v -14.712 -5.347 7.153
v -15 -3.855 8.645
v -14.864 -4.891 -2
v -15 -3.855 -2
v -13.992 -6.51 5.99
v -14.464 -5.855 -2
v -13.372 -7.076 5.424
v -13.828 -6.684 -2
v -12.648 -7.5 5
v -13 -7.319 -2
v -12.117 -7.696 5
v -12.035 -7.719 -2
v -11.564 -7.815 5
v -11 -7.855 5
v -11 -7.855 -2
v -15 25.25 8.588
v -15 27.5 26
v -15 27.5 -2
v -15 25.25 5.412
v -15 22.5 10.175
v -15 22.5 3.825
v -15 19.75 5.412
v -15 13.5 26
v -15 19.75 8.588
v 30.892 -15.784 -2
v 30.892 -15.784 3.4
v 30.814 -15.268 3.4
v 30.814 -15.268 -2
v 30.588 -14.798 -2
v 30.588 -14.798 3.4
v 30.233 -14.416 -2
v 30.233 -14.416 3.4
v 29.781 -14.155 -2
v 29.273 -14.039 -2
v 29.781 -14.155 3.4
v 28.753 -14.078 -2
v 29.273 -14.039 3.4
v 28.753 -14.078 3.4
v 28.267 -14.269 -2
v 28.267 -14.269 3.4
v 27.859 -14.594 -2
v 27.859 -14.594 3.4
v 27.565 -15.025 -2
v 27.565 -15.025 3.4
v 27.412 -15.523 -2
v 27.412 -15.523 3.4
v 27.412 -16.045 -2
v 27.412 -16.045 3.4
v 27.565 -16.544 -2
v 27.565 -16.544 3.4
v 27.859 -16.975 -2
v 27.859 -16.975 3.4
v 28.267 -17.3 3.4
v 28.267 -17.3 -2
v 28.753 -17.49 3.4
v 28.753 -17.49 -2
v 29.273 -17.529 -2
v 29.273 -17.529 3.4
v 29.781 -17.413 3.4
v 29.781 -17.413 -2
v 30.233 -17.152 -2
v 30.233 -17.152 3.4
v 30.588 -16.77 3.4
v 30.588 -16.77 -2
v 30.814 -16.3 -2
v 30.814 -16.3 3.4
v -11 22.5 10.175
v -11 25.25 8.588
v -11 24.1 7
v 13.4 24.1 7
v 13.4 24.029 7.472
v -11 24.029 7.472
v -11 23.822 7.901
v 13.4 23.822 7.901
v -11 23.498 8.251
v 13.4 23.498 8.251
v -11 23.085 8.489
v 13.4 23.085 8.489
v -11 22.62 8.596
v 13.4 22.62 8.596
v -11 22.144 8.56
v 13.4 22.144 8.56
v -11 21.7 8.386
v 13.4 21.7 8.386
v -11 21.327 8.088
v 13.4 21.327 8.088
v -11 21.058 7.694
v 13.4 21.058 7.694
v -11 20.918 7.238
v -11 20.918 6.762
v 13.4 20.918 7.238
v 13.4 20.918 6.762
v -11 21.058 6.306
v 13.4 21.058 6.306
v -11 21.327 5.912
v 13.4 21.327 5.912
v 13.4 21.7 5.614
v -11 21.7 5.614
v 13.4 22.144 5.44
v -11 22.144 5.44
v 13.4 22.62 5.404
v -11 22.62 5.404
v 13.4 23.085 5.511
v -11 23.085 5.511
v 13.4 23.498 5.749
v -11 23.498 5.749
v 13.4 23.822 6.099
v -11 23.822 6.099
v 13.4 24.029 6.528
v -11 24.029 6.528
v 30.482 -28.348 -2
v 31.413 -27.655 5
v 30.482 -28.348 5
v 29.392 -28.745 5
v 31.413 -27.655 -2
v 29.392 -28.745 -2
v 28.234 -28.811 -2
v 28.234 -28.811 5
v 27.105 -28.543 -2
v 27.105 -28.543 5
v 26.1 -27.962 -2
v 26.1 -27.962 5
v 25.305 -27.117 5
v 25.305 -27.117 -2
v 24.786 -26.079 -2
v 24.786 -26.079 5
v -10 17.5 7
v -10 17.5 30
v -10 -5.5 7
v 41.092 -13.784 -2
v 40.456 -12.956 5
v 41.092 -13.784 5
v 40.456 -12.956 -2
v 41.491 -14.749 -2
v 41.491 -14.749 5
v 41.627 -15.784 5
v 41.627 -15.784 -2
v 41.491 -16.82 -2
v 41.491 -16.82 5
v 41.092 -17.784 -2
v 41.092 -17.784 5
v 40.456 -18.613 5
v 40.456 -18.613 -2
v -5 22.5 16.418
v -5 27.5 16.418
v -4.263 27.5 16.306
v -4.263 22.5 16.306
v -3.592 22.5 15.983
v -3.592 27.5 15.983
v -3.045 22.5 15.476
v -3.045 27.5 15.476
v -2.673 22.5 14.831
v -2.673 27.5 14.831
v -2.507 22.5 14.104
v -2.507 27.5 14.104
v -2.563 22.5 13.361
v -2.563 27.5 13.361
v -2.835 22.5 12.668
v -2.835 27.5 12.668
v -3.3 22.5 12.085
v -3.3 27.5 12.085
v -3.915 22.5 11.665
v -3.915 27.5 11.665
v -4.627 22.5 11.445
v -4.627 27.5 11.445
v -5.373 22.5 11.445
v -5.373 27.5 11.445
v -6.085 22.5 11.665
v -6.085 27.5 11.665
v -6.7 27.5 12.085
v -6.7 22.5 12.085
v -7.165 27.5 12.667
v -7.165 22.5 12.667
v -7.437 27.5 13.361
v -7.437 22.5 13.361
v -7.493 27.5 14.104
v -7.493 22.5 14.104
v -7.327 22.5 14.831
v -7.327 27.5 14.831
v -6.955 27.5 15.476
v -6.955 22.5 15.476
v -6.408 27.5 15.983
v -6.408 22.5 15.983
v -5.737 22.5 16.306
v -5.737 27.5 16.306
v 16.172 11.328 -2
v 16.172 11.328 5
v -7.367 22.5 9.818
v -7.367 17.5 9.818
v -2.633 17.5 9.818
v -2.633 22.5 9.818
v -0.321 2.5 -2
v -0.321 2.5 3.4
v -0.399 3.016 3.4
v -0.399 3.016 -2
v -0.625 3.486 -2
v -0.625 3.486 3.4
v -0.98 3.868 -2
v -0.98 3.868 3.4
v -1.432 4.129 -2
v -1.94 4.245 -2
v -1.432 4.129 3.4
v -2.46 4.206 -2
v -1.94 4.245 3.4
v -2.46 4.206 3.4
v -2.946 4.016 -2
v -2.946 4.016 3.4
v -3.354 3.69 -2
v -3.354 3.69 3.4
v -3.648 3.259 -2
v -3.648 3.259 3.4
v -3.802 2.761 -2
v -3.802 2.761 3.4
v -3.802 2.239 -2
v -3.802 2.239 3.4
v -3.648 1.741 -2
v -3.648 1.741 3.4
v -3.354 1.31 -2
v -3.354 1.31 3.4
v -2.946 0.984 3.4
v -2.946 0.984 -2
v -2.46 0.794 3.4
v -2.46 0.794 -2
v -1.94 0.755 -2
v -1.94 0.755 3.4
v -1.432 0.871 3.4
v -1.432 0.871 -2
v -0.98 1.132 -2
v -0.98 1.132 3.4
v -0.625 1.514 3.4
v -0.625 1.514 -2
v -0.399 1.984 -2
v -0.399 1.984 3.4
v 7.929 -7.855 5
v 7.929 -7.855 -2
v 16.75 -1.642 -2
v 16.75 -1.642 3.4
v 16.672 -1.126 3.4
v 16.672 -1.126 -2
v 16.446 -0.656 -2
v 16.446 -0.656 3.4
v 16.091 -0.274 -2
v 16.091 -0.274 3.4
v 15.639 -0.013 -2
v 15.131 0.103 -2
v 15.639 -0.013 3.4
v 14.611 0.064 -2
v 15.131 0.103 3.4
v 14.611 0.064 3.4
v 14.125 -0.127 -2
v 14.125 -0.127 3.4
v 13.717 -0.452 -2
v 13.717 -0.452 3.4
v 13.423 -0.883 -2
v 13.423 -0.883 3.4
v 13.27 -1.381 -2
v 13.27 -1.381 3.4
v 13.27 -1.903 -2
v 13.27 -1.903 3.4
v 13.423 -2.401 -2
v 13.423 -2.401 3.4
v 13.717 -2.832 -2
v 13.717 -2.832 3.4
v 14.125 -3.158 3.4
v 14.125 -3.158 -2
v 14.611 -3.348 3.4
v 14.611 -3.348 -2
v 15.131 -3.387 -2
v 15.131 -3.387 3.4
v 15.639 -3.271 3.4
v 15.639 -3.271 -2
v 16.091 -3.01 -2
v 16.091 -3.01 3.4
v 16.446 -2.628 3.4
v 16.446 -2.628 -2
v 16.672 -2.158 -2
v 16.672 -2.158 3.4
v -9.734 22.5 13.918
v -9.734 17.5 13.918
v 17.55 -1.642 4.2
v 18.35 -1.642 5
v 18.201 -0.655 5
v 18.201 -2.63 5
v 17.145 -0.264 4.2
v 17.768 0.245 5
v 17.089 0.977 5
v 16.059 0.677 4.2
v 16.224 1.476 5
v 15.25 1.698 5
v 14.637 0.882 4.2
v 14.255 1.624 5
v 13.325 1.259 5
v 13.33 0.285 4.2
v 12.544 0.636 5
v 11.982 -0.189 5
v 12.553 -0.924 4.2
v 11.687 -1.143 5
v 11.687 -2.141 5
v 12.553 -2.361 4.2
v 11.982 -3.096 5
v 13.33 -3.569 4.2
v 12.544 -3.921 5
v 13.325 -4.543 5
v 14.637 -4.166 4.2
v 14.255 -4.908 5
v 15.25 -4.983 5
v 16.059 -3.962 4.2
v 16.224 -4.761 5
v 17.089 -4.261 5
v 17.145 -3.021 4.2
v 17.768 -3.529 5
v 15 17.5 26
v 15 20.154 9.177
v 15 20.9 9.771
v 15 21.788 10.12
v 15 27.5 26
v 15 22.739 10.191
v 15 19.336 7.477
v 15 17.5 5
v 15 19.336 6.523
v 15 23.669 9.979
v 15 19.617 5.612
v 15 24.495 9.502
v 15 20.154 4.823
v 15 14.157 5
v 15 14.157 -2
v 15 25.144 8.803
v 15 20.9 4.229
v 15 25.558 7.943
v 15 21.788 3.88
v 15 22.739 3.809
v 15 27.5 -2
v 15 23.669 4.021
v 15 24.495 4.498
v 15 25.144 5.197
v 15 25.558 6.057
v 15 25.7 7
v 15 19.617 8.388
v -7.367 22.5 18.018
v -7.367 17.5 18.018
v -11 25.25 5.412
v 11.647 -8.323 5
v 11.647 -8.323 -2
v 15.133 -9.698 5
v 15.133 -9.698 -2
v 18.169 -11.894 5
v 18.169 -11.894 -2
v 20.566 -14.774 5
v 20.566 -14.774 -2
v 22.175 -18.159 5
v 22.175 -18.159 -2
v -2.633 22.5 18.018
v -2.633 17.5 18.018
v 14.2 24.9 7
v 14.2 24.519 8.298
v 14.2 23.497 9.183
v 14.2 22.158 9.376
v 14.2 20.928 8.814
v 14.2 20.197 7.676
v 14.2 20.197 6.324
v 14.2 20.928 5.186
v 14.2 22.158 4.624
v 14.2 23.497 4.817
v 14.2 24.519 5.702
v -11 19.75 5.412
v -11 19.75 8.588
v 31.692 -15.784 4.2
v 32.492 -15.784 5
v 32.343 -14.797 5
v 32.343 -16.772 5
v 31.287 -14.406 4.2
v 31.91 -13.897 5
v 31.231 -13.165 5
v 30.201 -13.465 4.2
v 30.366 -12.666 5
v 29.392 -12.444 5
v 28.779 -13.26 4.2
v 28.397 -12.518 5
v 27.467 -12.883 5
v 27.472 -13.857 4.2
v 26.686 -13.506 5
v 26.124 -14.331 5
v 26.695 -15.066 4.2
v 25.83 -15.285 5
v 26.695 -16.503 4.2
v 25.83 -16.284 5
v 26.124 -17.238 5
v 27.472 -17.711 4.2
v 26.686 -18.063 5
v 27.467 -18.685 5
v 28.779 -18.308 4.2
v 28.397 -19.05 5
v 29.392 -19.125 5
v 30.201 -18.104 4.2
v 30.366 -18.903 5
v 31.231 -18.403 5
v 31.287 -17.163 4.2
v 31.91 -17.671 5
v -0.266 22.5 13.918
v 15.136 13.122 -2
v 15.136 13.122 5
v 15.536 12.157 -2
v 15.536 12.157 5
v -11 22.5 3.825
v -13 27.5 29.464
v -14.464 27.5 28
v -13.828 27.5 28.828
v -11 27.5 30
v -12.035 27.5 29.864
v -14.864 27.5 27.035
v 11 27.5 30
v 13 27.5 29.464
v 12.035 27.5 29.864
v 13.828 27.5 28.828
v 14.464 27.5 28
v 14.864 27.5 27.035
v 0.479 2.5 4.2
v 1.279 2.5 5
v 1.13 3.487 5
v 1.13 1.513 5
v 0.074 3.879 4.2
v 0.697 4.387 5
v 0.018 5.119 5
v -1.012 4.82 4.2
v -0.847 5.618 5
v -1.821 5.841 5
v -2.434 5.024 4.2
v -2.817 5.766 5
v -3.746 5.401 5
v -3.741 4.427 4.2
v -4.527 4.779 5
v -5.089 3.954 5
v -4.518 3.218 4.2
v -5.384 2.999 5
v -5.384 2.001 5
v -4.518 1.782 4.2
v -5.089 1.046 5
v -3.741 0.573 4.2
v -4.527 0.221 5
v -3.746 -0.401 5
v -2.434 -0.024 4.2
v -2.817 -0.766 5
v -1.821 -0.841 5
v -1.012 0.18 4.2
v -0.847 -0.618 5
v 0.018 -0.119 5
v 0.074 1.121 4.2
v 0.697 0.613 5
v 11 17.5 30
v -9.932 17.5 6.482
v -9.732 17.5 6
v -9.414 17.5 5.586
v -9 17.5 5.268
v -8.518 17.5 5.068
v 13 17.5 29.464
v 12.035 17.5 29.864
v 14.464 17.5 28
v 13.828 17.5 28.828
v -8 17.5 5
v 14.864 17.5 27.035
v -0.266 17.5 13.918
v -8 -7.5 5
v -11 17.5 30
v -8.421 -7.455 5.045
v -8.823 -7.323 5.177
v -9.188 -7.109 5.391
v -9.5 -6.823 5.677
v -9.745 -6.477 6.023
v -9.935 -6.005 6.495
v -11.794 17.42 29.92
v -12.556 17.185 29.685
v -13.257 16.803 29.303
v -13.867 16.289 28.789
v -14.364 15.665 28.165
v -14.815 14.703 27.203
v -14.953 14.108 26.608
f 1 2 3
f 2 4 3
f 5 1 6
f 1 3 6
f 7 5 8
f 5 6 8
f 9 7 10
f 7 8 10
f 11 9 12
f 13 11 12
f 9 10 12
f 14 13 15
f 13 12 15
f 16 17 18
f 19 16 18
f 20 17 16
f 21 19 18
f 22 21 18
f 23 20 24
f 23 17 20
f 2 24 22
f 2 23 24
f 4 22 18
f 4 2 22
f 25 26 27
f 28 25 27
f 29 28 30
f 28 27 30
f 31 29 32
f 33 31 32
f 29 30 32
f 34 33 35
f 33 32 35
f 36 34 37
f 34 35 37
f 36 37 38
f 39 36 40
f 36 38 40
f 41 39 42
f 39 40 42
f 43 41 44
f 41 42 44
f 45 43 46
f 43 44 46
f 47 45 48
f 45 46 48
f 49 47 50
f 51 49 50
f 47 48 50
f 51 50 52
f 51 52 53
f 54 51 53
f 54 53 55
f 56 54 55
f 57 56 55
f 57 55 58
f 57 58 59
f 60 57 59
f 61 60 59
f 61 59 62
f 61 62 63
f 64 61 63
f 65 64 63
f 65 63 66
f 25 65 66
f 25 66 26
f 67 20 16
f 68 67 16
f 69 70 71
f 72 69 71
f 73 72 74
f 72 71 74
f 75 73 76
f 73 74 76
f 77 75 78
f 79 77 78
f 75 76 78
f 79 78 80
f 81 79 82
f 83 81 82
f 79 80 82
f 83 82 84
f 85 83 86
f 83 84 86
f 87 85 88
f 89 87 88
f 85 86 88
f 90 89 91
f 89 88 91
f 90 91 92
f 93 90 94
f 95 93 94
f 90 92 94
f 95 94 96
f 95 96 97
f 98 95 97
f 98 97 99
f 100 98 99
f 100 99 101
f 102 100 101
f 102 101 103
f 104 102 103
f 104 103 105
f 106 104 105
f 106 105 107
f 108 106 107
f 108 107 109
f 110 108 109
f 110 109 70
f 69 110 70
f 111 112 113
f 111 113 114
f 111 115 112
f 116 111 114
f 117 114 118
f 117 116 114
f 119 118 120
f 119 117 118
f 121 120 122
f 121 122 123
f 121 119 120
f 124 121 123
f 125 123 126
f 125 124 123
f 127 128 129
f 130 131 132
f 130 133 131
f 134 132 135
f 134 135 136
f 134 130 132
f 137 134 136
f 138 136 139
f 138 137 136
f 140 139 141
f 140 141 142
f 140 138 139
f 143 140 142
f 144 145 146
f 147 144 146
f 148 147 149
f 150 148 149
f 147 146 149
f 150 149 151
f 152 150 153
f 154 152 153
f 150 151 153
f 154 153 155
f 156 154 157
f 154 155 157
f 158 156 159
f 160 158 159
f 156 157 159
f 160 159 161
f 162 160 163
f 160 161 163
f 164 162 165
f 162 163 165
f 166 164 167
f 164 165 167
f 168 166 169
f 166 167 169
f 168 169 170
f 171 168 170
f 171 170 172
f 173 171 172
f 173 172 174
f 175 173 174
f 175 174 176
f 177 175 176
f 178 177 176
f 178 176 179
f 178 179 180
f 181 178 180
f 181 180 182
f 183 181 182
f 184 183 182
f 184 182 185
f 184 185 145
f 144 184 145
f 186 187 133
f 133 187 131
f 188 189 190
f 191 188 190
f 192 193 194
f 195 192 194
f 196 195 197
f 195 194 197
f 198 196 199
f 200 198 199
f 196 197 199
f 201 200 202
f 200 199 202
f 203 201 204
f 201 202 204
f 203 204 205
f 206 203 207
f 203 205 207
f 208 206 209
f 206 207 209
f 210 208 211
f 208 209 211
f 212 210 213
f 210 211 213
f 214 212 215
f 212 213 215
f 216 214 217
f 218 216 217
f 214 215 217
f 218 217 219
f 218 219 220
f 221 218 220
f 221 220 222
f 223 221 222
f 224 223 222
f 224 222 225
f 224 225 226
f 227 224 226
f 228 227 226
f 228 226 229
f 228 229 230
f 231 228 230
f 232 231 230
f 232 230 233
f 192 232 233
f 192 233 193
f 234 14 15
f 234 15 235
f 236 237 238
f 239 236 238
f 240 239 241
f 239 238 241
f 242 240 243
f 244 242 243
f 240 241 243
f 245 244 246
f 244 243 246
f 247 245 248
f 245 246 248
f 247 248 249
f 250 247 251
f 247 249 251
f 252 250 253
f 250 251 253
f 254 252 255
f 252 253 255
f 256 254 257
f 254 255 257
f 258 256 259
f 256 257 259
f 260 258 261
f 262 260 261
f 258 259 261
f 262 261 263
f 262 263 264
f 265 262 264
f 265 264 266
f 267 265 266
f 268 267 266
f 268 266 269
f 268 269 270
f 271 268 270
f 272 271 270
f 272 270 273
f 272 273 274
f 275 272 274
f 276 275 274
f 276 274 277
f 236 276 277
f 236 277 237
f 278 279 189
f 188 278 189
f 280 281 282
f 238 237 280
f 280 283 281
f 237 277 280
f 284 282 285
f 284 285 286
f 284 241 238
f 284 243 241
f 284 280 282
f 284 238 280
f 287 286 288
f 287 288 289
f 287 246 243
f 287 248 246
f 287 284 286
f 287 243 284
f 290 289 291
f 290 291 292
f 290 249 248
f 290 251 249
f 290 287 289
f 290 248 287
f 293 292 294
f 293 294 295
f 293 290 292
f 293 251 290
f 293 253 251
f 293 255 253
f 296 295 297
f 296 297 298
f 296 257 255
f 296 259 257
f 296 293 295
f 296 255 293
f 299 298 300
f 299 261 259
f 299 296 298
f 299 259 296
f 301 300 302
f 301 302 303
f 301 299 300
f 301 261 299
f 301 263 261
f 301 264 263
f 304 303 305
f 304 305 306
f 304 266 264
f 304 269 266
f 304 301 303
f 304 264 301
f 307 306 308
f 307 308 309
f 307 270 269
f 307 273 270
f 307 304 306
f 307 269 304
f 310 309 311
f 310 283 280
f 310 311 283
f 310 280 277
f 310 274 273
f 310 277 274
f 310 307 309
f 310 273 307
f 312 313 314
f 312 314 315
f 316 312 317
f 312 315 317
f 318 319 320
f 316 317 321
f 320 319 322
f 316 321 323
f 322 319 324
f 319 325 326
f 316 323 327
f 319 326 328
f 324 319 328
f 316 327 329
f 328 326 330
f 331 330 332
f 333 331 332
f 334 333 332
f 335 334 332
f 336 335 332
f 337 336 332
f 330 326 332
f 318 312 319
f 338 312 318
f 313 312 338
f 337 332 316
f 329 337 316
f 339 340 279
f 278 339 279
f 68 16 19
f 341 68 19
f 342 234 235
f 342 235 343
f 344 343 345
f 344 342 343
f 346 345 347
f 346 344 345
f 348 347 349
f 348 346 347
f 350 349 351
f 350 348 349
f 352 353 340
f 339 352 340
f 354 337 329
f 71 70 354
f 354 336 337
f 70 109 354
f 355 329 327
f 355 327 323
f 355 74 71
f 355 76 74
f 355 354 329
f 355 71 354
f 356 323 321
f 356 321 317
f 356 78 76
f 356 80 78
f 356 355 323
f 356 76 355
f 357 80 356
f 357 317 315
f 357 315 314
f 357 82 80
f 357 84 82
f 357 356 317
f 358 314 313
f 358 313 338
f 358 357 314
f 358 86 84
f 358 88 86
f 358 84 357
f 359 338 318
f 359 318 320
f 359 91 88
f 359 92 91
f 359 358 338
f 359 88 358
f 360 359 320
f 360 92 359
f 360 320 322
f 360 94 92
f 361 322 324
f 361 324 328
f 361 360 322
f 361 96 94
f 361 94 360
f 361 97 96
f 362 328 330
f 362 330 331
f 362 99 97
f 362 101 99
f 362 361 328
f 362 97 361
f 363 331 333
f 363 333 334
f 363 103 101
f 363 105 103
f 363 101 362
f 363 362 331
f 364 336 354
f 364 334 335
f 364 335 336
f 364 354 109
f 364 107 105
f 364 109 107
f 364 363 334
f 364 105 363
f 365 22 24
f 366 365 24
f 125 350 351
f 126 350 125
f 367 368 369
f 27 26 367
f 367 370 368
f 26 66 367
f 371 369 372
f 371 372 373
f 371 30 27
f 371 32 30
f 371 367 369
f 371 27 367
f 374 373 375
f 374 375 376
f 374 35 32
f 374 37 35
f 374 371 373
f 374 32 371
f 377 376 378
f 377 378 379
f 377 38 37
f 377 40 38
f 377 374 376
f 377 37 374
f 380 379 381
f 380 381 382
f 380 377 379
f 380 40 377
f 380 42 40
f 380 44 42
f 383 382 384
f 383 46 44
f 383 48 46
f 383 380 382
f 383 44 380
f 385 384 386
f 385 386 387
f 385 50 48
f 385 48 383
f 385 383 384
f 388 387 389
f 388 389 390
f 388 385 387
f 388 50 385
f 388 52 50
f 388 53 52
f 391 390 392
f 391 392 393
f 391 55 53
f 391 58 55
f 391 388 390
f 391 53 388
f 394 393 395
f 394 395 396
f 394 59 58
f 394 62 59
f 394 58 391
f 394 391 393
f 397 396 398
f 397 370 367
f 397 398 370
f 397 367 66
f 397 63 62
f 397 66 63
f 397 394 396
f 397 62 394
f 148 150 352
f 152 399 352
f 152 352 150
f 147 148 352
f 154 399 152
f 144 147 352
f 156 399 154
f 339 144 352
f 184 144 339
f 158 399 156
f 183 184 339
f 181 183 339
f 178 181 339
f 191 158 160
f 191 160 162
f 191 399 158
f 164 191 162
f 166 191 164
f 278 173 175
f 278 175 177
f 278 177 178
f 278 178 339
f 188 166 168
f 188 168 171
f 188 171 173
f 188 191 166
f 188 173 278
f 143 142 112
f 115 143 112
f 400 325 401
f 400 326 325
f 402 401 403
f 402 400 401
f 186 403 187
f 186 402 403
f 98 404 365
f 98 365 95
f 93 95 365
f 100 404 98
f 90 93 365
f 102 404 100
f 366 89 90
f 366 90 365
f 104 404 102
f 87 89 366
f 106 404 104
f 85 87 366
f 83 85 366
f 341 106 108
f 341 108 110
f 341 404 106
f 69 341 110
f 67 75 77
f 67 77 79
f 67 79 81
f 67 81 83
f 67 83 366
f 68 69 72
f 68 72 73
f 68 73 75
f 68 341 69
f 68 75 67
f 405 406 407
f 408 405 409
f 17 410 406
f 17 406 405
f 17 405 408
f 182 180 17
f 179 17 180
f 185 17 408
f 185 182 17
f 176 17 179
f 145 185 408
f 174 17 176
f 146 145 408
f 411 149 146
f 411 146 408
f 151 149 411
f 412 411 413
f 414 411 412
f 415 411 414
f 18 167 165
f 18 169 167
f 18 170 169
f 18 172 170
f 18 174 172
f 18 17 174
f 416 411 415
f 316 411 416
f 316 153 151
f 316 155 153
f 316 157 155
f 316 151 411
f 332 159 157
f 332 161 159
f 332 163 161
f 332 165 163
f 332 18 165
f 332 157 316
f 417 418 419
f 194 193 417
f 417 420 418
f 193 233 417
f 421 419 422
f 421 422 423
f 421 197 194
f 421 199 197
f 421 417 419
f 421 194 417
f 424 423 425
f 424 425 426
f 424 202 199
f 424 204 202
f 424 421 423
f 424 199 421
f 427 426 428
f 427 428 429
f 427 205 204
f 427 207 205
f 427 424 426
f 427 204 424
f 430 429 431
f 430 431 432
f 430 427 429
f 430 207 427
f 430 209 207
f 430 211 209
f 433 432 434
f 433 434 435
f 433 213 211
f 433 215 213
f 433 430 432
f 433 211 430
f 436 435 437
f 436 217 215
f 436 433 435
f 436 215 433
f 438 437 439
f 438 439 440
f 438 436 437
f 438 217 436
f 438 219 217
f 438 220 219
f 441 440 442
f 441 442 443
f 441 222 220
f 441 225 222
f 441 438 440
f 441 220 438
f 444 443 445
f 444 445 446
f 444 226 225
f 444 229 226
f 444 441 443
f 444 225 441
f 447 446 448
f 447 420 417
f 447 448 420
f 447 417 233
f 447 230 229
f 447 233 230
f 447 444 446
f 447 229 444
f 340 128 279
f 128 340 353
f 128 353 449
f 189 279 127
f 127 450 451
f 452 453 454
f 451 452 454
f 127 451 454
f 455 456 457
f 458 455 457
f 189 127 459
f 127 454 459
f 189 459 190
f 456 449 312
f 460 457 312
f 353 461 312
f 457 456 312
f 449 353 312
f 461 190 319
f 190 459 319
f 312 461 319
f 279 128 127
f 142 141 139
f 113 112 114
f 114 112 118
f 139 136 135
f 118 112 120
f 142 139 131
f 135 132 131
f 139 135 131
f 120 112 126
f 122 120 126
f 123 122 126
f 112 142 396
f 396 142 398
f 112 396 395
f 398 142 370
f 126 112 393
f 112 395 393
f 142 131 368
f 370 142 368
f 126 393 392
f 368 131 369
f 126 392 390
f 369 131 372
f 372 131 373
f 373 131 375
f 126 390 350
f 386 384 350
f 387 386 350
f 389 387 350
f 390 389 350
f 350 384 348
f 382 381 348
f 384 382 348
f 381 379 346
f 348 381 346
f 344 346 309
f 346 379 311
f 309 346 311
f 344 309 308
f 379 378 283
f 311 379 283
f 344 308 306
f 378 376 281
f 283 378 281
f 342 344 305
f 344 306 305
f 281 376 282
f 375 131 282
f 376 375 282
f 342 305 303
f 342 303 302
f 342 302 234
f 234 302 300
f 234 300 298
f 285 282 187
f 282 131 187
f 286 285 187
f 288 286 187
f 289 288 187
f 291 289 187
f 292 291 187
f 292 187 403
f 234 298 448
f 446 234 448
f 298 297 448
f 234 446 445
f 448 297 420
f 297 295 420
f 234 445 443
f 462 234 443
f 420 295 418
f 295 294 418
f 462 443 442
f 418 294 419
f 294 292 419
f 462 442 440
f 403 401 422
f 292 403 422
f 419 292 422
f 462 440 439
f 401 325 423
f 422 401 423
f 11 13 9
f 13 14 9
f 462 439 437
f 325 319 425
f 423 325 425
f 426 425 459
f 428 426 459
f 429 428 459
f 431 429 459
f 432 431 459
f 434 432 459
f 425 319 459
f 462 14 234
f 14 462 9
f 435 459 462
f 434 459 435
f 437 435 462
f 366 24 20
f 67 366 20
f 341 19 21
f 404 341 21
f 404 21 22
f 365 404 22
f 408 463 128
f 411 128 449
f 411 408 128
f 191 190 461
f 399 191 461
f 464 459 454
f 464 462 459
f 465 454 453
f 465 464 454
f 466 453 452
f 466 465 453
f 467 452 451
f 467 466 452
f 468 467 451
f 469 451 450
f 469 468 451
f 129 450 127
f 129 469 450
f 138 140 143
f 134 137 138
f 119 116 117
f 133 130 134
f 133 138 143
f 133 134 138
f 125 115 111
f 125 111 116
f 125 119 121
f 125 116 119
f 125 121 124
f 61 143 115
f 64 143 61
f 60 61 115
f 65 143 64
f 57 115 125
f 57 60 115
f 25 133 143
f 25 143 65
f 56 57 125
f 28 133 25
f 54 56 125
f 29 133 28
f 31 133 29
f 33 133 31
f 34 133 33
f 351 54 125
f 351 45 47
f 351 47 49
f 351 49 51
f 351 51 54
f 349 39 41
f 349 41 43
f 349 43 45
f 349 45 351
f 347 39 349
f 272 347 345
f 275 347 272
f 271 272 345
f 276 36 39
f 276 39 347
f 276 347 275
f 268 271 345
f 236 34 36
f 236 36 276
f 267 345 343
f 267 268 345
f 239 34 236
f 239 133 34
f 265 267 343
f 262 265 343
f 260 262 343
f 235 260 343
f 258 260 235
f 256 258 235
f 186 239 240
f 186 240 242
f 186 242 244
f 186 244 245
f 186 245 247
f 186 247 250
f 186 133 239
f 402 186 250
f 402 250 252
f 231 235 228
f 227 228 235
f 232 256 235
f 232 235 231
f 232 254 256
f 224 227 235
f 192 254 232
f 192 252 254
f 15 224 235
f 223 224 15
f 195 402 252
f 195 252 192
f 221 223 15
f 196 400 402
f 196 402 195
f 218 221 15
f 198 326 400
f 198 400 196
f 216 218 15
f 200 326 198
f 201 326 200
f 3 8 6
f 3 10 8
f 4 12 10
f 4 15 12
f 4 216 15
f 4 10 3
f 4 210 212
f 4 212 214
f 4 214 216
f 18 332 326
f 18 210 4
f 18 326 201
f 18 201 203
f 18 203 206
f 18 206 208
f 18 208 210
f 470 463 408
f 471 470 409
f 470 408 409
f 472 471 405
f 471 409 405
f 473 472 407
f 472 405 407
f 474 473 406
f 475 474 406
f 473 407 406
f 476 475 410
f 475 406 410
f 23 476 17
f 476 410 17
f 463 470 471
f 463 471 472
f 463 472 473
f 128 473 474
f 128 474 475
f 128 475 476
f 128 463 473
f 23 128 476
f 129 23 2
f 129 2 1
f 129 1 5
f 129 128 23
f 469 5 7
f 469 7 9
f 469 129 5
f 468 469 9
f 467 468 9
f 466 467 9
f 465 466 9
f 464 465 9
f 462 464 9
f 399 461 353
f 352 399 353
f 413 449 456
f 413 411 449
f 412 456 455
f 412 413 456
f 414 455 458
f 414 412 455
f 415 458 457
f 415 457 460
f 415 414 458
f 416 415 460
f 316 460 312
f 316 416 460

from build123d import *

# Parameters (mm, degrees)
BOSS_EXTRUDE1_DEPTH      = 5
BOSS_EXTRUDE1_DEPTH_BACK = 2
SKETCH3_W                = 30
SKETCH3_H                = 10
BOSS_EXTRUDE2_DEPTH      = 25
SKETCH4_R                = 2.5
CUT_EXTRUDE1_DEPTH       = 83.331203834
RIB1_REACH               = 76.683
SKETCH6_WALL_W           = 186.72160491
SKETCH6_WALL_H           = 5
CUT_EXTRUDE2_DEPTH       = 7
CUT_EXTRUDE3_DEPTH       = 5
FILLET1_R                = 4
SKETCH9_R                = 1.75
CUT_EXTRUDE4_DEPTH       = 60.485369609
CHAMFER1_SIZE            = 1.6
FILLET2_R                = 4
SKETCH10_R               = 1.6
CUT_EXTRUDE5_DEPTH       = 52.293180378
CUT_EXTRUDE6_DEPTH       = 4
CHAMFER2_SIZE            = 1.6
FILLET3_R                = 2


with BuildPart() as part:
    # Sketch1 → Boss-Extrude1 (new, two sides)
    with BuildSketch(Plane.XY) as boss_extrude1_sk:
        Polygon((15, 27.5), (15, 12.5), (43.284271247, -15.784271247), (23.284271247, -35.784271247), (15, -27.5), (-15, -27.5), (-15, 27.5), align=None)
    extrude(amount=BOSS_EXTRUDE1_DEPTH)
    extrude(boss_extrude1_sk.sketch, amount=-BOSS_EXTRUDE1_DEPTH_BACK)

    # Sketch3 → Boss-Extrude2 (add)
    with BuildSketch(Plane.XY.offset(5)):
        with Locations((0, 22.5)):
            Rectangle(SKETCH3_W, SKETCH3_H)
    extrude(amount=BOSS_EXTRUDE2_DEPTH)

    # Sketch4 → Cut-Extrude1 (cut, through all)
    with BuildSketch(Plane(origin=(0, 27.5, 0), x_dir=(1, 0, 0), z_dir=(0, 1, 0))):
        with Locations(Location((-5, -13.9175, 0), (0, 0, 270))):
            Circle(SKETCH4_R)
    extrude(amount=-CUT_EXTRUDE1_DEPTH, mode=Mode.SUBTRACT)

    # Sketch6 wall → Rib1 (add, up to next)
    with BuildSketch(Plane(origin=(-15, 5, 17.5), x_dir=(0, -0.707106781187, -0.707106781187), z_dir=(0, -0.707106781187, 0.707106781187)), mode=Mode.PRIVATE) as rib1_sk1:
        with Locations((0, 2.5)):
            Rectangle(SKETCH6_WALL_W, SKETCH6_WALL_H)
    rib1_tool1 = extrude(rib1_sk1.sketch, amount=-RIB1_REACH, mode=Mode.PRIVATE) - part.part
    add(rib1_tool1.solids().sort_by_distance((-15, 5, 17.5))[0])

    # Sketch7 → Cut-Extrude2 (cut)
    with BuildSketch(Plane.XY.offset(5)):
        with BuildLine():
            Line((22.174744155, -18.158867896), (26.819805153, -32.248737342))
            Line((26.819805153, -32.248737342), (23.284271247, -35.784271247))
            Line((23.284271247, -35.784271247), (-15, -27.5))
            Line((-15, -27.5), (-15, -7.855339059))
            Line((-15, -7.855339059), (7.928932188, -7.855339059))
            ThreePointArc((7.928932188, -7.855339059), (16.719635588, -10.701182004), (22.174744155, -18.158867896))
        make_face()
    extrude(amount=-CUT_EXTRUDE2_DEPTH, mode=Mode.SUBTRACT)

    # Sketch8 → Cut-Extrude3 (cut)
    with BuildSketch(Plane(origin=(0, 17.5, 0), x_dir=(-1, 0, 0), z_dir=(0, -1, 0))):
        Polygon((0.265727793, -13.9175), (2.632863896, -18.0175), (7.367136104, -18.0175), (9.734272207, -13.9175), (7.367136104, -9.8175), (2.632863896, -9.8175), align=None)
    extrude(amount=-CUT_EXTRUDE3_DEPTH, mode=Mode.SUBTRACT)

    # Fillet1
    fillet1_edges = [part.edges().sort_by_distance(p)[0] for p in [
        (-15, 22.5, 30),
        (15, 22.5, 30),
    ]]
    fillet(fillet1_edges, radius=FILLET1_R)

    # Sketch9 → Cut-Extrude4 (cut, through all)
    with BuildSketch(Plane.XY.offset(5)):
        with Locations((15, -1.642135624)):
            Circle(SKETCH9_R)
        with Locations((29.142135624, -15.784271247)):
            Circle(SKETCH9_R)
        with Locations((-2.071067812, 2.5)):
            Circle(SKETCH9_R)
    extrude(amount=-CUT_EXTRUDE4_DEPTH, mode=Mode.SUBTRACT)

    # Chamfer1
    chamfer1_edges = [part.edges().sort_by_distance(p)[0] for p in [
        (-3.821067812, 2.5, 5),
        (27.392135624, -15.784271247, 5),
        (13.25, -1.642135624, 5),
    ]]
    chamfer(chamfer1_edges, length=CHAMFER1_SIZE)

    # Fillet2
    fillet2_edges = [part.edges().sort_by_distance(p)[0] for p in [
        (15, 12.5, 1.5),
        (43.284271247, -15.784271247, 1.5),
        (26.819805153, -32.248737342, 1.5),
        (-15, -7.855339059, 1.5),
    ]]
    fillet(fillet2_edges, radius=FILLET2_R)

    # Sketch10 → Cut-Extrude5 (cut, through all)
    with BuildSketch(Plane(origin=(15, 0, 0), x_dir=(0, 0, -1), z_dir=(1, 0, 0))):
        with Locations(Location((-7, 22.5, 0), (0, 0, 90))):
            Circle(SKETCH10_R)
    extrude(amount=-CUT_EXTRUDE5_DEPTH, mode=Mode.SUBTRACT)

    # Sketch11 → Cut-Extrude6 (cut)
    with BuildSketch(Plane.ZY.offset(15)):
        Polygon((8.58771324, 19.75), (10.175426481, 22.5), (8.58771324, 25.25), (5.41228676, 25.25), (3.824573519, 22.5), (5.41228676, 19.75), align=None)
    extrude(amount=-CUT_EXTRUDE6_DEPTH, mode=Mode.SUBTRACT)

    # Chamfer2
    chamfer2_edges = [part.edges().sort_by_distance(p)[0] for p in [
        (15, 20.9, 7),
    ]]
    chamfer(chamfer2_edges, length=CHAMFER2_SIZE)

    # Fillet3
    fillet3_edges = [part.edges().sort_by_distance(p)[0] for p in [
        (-10, 5, 5),
    ]]
    fillet(fillet3_edges, radius=FILLET3_R)


solid = part.part
